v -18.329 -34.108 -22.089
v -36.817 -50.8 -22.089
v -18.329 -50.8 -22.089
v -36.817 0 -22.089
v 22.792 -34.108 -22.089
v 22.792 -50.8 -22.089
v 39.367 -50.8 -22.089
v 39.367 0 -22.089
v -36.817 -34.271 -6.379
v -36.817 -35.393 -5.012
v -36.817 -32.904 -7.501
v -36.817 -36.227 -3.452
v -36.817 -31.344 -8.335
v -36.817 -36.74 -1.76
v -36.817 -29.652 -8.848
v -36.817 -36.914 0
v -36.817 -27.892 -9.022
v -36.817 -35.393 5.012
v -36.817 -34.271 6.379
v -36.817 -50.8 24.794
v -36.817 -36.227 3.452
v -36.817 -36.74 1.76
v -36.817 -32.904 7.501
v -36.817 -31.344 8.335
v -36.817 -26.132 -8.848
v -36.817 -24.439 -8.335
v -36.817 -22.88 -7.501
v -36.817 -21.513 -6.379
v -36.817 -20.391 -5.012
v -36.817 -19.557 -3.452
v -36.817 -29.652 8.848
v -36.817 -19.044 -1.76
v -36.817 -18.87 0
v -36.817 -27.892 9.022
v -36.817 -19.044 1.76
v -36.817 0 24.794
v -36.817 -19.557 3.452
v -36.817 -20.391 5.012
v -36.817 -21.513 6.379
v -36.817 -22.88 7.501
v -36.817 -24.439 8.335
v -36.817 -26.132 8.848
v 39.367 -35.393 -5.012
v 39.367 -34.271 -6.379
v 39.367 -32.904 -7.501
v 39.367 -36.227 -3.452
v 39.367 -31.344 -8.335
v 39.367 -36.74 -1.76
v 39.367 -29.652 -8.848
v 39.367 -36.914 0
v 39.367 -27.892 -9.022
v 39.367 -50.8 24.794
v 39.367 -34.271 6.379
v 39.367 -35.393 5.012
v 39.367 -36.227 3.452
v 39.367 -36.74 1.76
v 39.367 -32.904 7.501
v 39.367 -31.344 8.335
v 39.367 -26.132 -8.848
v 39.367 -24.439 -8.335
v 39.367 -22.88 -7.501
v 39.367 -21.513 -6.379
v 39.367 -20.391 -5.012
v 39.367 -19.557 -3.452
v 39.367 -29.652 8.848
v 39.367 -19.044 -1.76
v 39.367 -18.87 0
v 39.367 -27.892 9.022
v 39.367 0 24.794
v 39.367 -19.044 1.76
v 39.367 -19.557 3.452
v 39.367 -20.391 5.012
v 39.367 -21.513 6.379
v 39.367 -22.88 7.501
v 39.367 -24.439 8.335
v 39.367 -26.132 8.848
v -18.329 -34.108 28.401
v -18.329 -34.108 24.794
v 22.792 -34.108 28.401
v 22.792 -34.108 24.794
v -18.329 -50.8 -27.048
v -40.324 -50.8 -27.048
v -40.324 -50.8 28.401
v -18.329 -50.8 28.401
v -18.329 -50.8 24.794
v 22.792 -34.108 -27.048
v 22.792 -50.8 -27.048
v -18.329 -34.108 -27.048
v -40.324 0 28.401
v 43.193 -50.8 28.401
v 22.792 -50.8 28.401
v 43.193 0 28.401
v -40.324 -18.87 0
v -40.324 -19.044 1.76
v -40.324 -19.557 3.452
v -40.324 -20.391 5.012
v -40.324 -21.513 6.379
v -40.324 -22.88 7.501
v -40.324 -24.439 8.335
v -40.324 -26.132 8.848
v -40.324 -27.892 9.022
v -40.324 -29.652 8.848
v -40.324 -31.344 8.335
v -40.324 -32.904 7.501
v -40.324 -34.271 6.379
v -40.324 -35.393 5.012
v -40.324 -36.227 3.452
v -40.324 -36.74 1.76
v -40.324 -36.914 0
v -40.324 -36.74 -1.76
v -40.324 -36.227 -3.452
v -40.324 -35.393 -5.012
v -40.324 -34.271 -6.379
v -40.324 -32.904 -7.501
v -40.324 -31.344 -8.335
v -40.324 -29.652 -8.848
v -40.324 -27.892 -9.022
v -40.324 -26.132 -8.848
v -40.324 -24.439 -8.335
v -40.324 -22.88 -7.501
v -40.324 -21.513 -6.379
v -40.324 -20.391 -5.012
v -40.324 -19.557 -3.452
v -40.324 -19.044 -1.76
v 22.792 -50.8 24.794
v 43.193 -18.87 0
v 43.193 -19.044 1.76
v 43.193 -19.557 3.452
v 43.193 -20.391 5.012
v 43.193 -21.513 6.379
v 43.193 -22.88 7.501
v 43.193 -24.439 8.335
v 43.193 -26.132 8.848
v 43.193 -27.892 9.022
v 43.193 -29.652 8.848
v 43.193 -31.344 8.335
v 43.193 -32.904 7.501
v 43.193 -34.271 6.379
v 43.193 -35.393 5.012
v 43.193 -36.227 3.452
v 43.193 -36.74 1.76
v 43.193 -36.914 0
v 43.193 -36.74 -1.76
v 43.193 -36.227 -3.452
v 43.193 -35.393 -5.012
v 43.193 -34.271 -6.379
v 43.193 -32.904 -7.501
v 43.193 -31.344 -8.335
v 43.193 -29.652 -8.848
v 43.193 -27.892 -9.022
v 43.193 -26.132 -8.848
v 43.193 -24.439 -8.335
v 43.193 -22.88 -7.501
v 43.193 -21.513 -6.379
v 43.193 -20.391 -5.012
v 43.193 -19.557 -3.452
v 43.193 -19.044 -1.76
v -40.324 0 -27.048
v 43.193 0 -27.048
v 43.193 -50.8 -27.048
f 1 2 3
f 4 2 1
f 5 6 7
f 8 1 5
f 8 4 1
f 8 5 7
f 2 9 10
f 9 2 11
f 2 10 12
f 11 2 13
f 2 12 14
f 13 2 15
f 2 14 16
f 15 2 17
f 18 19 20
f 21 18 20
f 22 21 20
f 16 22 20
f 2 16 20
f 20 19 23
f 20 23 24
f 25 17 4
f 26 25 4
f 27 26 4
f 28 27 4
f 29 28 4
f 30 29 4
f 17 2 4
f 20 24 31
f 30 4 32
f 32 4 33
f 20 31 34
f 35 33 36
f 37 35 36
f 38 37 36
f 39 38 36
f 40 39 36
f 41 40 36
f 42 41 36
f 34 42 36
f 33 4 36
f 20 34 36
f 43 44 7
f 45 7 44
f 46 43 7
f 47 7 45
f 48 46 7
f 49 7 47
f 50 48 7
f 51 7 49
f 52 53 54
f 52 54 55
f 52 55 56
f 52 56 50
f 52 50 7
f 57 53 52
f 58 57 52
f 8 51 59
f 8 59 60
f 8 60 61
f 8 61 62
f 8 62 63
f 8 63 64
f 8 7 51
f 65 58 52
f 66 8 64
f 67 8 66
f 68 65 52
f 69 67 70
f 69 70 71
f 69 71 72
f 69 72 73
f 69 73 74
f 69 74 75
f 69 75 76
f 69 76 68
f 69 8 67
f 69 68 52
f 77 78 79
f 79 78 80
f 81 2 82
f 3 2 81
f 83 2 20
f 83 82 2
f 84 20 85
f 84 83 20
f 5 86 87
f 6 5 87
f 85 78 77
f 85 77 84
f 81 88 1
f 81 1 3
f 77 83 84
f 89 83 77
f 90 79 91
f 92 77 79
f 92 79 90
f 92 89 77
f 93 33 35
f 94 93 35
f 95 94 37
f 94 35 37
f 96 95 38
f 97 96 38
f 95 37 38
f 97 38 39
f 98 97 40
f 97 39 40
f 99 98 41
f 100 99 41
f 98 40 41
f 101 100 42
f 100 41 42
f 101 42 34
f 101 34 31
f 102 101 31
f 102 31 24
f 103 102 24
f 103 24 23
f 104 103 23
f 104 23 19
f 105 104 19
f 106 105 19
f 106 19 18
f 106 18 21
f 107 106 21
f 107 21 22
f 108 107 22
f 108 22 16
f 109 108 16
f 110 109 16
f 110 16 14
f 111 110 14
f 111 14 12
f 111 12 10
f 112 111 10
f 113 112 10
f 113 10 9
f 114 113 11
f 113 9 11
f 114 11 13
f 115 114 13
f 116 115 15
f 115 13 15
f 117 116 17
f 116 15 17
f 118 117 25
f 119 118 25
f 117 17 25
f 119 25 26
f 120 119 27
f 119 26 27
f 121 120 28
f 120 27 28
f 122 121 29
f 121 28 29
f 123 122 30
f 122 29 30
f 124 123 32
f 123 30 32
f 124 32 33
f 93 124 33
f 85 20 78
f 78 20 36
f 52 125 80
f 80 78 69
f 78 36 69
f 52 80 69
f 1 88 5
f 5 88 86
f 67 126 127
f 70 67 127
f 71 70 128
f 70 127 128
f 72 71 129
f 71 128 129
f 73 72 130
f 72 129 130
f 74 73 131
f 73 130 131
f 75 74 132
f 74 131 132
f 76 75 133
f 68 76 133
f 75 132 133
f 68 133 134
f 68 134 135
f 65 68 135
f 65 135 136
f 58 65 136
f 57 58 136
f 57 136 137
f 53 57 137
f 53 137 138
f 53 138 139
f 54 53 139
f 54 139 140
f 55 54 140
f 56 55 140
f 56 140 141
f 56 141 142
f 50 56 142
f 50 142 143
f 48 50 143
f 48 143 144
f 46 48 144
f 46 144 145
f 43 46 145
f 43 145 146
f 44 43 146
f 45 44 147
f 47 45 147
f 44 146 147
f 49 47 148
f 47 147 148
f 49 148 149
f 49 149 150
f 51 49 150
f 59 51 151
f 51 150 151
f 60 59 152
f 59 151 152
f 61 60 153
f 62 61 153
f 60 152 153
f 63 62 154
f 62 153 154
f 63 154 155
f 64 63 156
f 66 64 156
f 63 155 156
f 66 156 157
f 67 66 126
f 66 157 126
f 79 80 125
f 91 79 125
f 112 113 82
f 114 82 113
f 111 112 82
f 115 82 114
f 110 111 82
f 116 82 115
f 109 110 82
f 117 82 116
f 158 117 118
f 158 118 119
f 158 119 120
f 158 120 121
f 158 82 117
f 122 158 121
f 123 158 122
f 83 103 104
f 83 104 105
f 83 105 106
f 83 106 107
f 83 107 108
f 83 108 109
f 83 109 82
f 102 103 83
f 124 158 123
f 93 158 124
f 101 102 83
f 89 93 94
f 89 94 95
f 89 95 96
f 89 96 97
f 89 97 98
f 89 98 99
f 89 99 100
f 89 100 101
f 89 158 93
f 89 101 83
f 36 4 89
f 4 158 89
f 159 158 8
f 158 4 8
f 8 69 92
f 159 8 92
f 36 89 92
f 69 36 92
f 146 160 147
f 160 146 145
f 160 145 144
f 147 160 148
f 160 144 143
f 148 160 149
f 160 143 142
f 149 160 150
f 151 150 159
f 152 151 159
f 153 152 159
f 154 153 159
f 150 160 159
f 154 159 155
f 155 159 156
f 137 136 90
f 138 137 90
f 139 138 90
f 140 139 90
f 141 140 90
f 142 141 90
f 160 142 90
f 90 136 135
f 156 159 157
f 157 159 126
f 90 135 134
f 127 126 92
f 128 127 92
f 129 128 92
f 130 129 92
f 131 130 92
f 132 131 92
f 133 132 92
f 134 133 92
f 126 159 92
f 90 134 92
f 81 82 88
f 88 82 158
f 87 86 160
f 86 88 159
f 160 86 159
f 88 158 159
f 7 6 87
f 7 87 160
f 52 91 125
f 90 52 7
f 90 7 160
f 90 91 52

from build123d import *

# Parameters (mm, degrees)
F0_W     = 83.5164114833
F0_H     = 55.4486140609
F0_W_2   = 76.1848241091
F0_H_2   = 46.8833819032
F1_DEPTH = 50.8
F2_R     = 9.0216673632
F3_DEPTH = 113.284
F4_W     = 41.1206781864
F4_H     = 16.6921509981
F5_DEPTH = 1117.6


with BuildPart() as f1:
    # F0 (on Front) → F1 (new body)
    with BuildSketch(Plane.XZ):
        with Locations((1.4344416559, 0.6762035191)):
            Rectangle(F0_W, F0_H)
        with Locations((1.2750588357, 1.3524033129)):
            Rectangle(F0_W_2, F0_H_2, mode=Mode.SUBTRACT)
    extrude(amount=F1_DEPTH)

    # F2 (on face) → F3 (cut)
    with BuildSketch(Plane.YZ.offset(43.1926473975)):
        with Locations((-27.8919320554, 0)):
            Circle(F2_R)
    extrude(amount=-F3_DEPTH, mode=Mode.SUBTRACT)

    # F4 (on face) → F5 (cut)
    with BuildSketch(Plane(origin=(0, 0, -27.0481035113), x_dir=(1, 0, 0), z_dir=(0, 0, -1))):
        with Locations((2.2313538939, 42.4539245009)):
            Rectangle(F4_W, F4_H)
    extrude(amount=-F5_DEPTH, mode=Mode.SUBTRACT)


solid = f1.part
